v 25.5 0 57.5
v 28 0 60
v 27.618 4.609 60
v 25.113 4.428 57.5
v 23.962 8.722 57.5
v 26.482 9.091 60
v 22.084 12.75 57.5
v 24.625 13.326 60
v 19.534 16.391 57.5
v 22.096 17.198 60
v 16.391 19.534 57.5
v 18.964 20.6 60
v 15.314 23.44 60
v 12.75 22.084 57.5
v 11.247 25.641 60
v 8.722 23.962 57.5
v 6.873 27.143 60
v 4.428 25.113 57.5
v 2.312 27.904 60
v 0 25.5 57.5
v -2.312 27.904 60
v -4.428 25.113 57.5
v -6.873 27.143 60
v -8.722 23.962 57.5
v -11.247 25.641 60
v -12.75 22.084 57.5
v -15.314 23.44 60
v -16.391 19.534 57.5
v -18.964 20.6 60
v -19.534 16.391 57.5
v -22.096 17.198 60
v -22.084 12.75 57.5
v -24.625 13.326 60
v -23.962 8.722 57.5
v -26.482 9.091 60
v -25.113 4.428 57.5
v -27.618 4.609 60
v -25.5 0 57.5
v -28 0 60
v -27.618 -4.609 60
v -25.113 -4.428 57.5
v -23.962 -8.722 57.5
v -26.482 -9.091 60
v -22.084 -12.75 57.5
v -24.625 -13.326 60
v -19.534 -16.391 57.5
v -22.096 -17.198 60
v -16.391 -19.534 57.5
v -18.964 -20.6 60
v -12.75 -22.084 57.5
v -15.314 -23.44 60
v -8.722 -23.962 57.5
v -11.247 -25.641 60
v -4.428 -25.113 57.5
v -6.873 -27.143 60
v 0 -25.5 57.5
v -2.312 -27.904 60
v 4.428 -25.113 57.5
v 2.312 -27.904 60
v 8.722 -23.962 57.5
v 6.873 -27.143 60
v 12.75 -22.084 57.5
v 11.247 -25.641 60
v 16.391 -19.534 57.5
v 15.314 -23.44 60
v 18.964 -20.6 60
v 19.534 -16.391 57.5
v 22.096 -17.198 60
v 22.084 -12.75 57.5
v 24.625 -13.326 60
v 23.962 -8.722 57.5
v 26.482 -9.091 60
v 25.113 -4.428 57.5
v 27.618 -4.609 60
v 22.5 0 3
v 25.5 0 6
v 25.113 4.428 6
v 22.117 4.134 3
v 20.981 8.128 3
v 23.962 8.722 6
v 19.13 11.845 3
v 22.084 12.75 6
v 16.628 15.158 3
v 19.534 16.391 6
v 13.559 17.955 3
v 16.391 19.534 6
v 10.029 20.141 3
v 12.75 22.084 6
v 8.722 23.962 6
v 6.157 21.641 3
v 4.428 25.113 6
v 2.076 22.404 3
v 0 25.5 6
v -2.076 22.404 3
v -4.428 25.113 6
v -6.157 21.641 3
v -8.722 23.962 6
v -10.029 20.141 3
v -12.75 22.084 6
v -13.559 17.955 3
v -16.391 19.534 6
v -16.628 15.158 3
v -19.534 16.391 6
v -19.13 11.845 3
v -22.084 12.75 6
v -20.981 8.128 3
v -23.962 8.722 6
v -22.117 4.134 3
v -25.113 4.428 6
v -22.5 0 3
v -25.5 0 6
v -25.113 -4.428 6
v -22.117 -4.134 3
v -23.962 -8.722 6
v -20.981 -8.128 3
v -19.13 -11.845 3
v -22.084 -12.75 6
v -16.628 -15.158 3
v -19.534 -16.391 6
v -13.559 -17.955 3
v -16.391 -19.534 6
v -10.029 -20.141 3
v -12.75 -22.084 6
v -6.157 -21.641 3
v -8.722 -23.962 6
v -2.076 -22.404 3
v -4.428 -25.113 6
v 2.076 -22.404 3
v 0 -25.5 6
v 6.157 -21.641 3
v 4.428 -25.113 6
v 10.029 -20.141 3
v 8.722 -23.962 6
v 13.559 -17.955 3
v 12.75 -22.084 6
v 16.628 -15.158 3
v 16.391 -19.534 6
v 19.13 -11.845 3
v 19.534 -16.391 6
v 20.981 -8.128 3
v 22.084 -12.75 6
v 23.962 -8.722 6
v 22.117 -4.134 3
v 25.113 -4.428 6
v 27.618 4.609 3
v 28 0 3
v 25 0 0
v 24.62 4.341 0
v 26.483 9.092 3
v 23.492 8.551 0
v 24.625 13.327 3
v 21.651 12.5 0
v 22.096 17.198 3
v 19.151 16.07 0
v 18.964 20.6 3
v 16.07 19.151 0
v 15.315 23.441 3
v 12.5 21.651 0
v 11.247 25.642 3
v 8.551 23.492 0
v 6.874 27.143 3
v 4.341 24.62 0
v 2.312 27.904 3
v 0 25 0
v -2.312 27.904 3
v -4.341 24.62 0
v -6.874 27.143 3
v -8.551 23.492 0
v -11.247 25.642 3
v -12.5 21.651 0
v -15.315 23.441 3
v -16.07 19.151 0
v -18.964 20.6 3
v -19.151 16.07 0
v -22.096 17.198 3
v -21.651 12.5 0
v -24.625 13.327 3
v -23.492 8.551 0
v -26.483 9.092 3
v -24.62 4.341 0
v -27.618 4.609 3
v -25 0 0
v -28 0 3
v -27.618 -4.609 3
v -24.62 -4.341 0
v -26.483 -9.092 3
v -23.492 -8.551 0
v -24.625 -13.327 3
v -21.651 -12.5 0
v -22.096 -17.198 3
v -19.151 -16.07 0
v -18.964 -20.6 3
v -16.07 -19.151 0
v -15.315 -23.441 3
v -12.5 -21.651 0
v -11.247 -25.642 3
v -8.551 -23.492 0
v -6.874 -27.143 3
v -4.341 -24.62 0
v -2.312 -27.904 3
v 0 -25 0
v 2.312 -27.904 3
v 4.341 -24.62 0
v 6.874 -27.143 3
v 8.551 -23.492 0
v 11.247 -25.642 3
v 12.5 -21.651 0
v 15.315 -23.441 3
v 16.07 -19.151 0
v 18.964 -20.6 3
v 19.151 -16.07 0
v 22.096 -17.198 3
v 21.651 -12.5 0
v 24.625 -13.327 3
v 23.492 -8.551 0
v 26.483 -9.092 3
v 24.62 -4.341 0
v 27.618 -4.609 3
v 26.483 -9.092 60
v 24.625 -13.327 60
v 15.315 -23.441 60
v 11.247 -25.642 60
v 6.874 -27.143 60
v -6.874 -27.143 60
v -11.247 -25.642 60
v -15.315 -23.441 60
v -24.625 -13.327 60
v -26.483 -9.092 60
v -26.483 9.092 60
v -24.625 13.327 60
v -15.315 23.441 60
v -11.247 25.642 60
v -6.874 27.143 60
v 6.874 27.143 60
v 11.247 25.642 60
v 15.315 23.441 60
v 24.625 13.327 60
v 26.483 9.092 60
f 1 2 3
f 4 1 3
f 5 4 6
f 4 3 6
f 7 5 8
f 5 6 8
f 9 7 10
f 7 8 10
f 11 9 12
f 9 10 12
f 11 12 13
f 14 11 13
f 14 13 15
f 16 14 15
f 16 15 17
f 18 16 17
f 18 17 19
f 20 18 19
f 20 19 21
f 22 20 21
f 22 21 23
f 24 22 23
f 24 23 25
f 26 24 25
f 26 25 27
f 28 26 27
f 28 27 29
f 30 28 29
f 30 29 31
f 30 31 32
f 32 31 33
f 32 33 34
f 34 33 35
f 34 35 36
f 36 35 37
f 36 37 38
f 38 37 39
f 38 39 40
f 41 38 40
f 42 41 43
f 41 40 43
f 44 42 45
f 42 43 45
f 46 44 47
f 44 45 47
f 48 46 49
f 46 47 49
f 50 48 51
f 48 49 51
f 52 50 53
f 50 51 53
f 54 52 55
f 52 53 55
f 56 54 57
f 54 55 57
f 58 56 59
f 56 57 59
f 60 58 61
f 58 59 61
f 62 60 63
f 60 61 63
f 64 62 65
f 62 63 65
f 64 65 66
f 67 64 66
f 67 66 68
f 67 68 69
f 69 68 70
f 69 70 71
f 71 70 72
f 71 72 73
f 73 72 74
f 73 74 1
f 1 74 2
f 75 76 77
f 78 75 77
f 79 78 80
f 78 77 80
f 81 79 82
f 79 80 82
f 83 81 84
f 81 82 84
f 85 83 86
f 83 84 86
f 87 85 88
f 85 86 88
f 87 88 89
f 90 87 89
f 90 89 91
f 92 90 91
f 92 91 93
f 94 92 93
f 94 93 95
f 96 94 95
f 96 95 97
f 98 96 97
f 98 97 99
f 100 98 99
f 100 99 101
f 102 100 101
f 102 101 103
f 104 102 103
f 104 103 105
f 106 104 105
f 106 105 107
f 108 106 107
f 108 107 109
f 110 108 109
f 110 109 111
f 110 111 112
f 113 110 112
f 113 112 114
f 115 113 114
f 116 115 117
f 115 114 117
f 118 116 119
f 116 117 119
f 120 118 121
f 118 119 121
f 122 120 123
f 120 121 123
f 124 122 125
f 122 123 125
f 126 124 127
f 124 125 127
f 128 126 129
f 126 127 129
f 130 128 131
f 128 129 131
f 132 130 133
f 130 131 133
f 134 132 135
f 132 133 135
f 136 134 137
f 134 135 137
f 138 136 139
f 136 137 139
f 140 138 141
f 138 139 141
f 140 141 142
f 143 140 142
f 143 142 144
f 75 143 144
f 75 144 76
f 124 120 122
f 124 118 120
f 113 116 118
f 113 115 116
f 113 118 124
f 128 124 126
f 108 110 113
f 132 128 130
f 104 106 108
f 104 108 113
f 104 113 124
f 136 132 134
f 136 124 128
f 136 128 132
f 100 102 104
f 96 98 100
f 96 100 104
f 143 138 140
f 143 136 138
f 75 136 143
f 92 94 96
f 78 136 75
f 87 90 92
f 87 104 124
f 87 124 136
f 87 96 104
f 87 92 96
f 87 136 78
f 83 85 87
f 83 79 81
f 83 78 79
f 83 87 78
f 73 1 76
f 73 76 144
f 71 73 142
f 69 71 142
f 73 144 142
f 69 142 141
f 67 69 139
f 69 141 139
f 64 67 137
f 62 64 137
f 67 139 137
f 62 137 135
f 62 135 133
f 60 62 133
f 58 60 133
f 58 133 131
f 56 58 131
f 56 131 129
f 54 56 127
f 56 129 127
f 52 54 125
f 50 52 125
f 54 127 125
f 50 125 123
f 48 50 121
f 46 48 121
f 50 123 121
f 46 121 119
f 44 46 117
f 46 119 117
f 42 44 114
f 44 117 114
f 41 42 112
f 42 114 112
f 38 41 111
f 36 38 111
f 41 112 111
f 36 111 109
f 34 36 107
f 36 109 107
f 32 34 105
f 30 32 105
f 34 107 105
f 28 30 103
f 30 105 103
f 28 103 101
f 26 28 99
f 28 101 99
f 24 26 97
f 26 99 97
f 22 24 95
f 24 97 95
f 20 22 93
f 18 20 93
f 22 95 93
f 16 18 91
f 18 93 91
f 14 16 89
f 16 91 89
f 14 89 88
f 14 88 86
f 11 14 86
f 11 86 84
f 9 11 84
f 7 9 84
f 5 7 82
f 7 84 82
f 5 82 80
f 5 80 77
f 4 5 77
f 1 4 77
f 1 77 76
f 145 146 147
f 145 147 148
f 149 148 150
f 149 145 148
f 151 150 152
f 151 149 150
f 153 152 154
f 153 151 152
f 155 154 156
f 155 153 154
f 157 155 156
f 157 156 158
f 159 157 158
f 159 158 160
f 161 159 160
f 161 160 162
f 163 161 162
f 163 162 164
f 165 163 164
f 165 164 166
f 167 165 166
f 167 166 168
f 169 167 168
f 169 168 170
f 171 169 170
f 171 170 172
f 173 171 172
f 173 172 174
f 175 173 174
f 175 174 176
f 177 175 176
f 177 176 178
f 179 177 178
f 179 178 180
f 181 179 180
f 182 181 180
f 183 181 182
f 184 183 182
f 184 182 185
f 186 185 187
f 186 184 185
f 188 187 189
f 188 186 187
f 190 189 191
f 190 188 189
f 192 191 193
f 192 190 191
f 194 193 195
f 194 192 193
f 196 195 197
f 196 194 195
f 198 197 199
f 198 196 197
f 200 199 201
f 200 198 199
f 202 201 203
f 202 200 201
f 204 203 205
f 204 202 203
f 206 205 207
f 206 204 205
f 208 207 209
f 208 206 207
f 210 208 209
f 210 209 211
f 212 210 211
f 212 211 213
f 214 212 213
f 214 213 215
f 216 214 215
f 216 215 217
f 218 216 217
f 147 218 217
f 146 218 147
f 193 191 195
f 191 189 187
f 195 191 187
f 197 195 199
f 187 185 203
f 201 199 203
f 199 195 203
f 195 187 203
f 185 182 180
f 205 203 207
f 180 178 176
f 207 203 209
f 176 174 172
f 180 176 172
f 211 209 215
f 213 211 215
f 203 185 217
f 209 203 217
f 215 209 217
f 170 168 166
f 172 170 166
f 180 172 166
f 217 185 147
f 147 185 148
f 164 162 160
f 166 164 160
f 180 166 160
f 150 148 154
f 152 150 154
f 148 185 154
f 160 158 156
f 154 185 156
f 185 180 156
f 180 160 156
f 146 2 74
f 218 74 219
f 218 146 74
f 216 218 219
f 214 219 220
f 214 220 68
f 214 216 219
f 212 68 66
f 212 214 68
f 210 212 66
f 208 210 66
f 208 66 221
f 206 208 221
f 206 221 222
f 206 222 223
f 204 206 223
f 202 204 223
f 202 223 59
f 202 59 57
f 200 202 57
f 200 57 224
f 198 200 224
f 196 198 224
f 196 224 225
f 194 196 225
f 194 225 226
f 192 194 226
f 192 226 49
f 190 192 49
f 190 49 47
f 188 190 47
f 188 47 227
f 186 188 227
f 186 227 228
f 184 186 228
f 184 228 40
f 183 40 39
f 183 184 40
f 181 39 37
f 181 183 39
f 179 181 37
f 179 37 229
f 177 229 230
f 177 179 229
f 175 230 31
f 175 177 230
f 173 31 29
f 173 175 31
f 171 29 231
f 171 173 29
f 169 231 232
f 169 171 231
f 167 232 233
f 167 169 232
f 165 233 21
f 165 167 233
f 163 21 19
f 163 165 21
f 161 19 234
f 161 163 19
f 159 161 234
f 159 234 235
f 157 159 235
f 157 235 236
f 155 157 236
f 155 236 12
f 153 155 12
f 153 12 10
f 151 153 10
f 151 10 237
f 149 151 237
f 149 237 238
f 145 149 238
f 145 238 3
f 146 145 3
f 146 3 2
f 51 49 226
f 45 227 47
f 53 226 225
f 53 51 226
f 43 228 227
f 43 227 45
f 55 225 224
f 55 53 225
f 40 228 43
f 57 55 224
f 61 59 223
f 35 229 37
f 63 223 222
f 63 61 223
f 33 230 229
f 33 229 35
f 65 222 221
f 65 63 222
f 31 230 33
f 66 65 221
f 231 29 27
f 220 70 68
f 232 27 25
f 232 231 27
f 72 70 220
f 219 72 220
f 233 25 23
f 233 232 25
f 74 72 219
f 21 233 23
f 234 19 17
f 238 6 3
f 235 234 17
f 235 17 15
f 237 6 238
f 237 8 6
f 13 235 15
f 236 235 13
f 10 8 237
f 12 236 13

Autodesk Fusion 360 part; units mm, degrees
sketch "Sketch1" plane through (0, 0, 0) normal (0, 0, 1) x (1, 0, 0)
  circle A0 centre (0, 0) radius 25
  circle A1 centre (0, 0) radius 28
  dimension "d4" = 50
  dimension "d5" = 56
extrude "Extrude1" add sketch "Sketch1" along normal blind 3 contours A0
extrude "Extrude2" add sketch "Sketch1" along normal blind 60
chamfer "Chamfer2" distance 3 angle 45 1 edges at (-26.1052, -10.1252, 0)
move_face "OffsetFaces1" offset -0.5 1 faces at (24.8758, -2.4892, 22)
chamfer "Chamfer3" distance 3 angle 45 1 edges at (-23.7743, -9.2212, 3)
chamfer "Chamfer4" distance 2.5 angle 45 1 edges at (-23.7743, 9.2212, 60)
equation "wall_thinkness = 3 mm"
equation "pot_height = 60 mm"
equation "pot_diameter = 50 mm"
equation "d4 = pot_diameter"
equation "d5 = pot_diameter + ( 2 * wall_thinkness )"
equation "d6 = wall_thinkness"
equation "d8 = pot_height"
equation "pot_bottom_outer_fillet = 10 mm"
equation "pot_finger_cutout_num = 2"
equation "pot_finger_cutout_width = 20 mm"
equation "pot_finger_cutout_height = 7 mm"
